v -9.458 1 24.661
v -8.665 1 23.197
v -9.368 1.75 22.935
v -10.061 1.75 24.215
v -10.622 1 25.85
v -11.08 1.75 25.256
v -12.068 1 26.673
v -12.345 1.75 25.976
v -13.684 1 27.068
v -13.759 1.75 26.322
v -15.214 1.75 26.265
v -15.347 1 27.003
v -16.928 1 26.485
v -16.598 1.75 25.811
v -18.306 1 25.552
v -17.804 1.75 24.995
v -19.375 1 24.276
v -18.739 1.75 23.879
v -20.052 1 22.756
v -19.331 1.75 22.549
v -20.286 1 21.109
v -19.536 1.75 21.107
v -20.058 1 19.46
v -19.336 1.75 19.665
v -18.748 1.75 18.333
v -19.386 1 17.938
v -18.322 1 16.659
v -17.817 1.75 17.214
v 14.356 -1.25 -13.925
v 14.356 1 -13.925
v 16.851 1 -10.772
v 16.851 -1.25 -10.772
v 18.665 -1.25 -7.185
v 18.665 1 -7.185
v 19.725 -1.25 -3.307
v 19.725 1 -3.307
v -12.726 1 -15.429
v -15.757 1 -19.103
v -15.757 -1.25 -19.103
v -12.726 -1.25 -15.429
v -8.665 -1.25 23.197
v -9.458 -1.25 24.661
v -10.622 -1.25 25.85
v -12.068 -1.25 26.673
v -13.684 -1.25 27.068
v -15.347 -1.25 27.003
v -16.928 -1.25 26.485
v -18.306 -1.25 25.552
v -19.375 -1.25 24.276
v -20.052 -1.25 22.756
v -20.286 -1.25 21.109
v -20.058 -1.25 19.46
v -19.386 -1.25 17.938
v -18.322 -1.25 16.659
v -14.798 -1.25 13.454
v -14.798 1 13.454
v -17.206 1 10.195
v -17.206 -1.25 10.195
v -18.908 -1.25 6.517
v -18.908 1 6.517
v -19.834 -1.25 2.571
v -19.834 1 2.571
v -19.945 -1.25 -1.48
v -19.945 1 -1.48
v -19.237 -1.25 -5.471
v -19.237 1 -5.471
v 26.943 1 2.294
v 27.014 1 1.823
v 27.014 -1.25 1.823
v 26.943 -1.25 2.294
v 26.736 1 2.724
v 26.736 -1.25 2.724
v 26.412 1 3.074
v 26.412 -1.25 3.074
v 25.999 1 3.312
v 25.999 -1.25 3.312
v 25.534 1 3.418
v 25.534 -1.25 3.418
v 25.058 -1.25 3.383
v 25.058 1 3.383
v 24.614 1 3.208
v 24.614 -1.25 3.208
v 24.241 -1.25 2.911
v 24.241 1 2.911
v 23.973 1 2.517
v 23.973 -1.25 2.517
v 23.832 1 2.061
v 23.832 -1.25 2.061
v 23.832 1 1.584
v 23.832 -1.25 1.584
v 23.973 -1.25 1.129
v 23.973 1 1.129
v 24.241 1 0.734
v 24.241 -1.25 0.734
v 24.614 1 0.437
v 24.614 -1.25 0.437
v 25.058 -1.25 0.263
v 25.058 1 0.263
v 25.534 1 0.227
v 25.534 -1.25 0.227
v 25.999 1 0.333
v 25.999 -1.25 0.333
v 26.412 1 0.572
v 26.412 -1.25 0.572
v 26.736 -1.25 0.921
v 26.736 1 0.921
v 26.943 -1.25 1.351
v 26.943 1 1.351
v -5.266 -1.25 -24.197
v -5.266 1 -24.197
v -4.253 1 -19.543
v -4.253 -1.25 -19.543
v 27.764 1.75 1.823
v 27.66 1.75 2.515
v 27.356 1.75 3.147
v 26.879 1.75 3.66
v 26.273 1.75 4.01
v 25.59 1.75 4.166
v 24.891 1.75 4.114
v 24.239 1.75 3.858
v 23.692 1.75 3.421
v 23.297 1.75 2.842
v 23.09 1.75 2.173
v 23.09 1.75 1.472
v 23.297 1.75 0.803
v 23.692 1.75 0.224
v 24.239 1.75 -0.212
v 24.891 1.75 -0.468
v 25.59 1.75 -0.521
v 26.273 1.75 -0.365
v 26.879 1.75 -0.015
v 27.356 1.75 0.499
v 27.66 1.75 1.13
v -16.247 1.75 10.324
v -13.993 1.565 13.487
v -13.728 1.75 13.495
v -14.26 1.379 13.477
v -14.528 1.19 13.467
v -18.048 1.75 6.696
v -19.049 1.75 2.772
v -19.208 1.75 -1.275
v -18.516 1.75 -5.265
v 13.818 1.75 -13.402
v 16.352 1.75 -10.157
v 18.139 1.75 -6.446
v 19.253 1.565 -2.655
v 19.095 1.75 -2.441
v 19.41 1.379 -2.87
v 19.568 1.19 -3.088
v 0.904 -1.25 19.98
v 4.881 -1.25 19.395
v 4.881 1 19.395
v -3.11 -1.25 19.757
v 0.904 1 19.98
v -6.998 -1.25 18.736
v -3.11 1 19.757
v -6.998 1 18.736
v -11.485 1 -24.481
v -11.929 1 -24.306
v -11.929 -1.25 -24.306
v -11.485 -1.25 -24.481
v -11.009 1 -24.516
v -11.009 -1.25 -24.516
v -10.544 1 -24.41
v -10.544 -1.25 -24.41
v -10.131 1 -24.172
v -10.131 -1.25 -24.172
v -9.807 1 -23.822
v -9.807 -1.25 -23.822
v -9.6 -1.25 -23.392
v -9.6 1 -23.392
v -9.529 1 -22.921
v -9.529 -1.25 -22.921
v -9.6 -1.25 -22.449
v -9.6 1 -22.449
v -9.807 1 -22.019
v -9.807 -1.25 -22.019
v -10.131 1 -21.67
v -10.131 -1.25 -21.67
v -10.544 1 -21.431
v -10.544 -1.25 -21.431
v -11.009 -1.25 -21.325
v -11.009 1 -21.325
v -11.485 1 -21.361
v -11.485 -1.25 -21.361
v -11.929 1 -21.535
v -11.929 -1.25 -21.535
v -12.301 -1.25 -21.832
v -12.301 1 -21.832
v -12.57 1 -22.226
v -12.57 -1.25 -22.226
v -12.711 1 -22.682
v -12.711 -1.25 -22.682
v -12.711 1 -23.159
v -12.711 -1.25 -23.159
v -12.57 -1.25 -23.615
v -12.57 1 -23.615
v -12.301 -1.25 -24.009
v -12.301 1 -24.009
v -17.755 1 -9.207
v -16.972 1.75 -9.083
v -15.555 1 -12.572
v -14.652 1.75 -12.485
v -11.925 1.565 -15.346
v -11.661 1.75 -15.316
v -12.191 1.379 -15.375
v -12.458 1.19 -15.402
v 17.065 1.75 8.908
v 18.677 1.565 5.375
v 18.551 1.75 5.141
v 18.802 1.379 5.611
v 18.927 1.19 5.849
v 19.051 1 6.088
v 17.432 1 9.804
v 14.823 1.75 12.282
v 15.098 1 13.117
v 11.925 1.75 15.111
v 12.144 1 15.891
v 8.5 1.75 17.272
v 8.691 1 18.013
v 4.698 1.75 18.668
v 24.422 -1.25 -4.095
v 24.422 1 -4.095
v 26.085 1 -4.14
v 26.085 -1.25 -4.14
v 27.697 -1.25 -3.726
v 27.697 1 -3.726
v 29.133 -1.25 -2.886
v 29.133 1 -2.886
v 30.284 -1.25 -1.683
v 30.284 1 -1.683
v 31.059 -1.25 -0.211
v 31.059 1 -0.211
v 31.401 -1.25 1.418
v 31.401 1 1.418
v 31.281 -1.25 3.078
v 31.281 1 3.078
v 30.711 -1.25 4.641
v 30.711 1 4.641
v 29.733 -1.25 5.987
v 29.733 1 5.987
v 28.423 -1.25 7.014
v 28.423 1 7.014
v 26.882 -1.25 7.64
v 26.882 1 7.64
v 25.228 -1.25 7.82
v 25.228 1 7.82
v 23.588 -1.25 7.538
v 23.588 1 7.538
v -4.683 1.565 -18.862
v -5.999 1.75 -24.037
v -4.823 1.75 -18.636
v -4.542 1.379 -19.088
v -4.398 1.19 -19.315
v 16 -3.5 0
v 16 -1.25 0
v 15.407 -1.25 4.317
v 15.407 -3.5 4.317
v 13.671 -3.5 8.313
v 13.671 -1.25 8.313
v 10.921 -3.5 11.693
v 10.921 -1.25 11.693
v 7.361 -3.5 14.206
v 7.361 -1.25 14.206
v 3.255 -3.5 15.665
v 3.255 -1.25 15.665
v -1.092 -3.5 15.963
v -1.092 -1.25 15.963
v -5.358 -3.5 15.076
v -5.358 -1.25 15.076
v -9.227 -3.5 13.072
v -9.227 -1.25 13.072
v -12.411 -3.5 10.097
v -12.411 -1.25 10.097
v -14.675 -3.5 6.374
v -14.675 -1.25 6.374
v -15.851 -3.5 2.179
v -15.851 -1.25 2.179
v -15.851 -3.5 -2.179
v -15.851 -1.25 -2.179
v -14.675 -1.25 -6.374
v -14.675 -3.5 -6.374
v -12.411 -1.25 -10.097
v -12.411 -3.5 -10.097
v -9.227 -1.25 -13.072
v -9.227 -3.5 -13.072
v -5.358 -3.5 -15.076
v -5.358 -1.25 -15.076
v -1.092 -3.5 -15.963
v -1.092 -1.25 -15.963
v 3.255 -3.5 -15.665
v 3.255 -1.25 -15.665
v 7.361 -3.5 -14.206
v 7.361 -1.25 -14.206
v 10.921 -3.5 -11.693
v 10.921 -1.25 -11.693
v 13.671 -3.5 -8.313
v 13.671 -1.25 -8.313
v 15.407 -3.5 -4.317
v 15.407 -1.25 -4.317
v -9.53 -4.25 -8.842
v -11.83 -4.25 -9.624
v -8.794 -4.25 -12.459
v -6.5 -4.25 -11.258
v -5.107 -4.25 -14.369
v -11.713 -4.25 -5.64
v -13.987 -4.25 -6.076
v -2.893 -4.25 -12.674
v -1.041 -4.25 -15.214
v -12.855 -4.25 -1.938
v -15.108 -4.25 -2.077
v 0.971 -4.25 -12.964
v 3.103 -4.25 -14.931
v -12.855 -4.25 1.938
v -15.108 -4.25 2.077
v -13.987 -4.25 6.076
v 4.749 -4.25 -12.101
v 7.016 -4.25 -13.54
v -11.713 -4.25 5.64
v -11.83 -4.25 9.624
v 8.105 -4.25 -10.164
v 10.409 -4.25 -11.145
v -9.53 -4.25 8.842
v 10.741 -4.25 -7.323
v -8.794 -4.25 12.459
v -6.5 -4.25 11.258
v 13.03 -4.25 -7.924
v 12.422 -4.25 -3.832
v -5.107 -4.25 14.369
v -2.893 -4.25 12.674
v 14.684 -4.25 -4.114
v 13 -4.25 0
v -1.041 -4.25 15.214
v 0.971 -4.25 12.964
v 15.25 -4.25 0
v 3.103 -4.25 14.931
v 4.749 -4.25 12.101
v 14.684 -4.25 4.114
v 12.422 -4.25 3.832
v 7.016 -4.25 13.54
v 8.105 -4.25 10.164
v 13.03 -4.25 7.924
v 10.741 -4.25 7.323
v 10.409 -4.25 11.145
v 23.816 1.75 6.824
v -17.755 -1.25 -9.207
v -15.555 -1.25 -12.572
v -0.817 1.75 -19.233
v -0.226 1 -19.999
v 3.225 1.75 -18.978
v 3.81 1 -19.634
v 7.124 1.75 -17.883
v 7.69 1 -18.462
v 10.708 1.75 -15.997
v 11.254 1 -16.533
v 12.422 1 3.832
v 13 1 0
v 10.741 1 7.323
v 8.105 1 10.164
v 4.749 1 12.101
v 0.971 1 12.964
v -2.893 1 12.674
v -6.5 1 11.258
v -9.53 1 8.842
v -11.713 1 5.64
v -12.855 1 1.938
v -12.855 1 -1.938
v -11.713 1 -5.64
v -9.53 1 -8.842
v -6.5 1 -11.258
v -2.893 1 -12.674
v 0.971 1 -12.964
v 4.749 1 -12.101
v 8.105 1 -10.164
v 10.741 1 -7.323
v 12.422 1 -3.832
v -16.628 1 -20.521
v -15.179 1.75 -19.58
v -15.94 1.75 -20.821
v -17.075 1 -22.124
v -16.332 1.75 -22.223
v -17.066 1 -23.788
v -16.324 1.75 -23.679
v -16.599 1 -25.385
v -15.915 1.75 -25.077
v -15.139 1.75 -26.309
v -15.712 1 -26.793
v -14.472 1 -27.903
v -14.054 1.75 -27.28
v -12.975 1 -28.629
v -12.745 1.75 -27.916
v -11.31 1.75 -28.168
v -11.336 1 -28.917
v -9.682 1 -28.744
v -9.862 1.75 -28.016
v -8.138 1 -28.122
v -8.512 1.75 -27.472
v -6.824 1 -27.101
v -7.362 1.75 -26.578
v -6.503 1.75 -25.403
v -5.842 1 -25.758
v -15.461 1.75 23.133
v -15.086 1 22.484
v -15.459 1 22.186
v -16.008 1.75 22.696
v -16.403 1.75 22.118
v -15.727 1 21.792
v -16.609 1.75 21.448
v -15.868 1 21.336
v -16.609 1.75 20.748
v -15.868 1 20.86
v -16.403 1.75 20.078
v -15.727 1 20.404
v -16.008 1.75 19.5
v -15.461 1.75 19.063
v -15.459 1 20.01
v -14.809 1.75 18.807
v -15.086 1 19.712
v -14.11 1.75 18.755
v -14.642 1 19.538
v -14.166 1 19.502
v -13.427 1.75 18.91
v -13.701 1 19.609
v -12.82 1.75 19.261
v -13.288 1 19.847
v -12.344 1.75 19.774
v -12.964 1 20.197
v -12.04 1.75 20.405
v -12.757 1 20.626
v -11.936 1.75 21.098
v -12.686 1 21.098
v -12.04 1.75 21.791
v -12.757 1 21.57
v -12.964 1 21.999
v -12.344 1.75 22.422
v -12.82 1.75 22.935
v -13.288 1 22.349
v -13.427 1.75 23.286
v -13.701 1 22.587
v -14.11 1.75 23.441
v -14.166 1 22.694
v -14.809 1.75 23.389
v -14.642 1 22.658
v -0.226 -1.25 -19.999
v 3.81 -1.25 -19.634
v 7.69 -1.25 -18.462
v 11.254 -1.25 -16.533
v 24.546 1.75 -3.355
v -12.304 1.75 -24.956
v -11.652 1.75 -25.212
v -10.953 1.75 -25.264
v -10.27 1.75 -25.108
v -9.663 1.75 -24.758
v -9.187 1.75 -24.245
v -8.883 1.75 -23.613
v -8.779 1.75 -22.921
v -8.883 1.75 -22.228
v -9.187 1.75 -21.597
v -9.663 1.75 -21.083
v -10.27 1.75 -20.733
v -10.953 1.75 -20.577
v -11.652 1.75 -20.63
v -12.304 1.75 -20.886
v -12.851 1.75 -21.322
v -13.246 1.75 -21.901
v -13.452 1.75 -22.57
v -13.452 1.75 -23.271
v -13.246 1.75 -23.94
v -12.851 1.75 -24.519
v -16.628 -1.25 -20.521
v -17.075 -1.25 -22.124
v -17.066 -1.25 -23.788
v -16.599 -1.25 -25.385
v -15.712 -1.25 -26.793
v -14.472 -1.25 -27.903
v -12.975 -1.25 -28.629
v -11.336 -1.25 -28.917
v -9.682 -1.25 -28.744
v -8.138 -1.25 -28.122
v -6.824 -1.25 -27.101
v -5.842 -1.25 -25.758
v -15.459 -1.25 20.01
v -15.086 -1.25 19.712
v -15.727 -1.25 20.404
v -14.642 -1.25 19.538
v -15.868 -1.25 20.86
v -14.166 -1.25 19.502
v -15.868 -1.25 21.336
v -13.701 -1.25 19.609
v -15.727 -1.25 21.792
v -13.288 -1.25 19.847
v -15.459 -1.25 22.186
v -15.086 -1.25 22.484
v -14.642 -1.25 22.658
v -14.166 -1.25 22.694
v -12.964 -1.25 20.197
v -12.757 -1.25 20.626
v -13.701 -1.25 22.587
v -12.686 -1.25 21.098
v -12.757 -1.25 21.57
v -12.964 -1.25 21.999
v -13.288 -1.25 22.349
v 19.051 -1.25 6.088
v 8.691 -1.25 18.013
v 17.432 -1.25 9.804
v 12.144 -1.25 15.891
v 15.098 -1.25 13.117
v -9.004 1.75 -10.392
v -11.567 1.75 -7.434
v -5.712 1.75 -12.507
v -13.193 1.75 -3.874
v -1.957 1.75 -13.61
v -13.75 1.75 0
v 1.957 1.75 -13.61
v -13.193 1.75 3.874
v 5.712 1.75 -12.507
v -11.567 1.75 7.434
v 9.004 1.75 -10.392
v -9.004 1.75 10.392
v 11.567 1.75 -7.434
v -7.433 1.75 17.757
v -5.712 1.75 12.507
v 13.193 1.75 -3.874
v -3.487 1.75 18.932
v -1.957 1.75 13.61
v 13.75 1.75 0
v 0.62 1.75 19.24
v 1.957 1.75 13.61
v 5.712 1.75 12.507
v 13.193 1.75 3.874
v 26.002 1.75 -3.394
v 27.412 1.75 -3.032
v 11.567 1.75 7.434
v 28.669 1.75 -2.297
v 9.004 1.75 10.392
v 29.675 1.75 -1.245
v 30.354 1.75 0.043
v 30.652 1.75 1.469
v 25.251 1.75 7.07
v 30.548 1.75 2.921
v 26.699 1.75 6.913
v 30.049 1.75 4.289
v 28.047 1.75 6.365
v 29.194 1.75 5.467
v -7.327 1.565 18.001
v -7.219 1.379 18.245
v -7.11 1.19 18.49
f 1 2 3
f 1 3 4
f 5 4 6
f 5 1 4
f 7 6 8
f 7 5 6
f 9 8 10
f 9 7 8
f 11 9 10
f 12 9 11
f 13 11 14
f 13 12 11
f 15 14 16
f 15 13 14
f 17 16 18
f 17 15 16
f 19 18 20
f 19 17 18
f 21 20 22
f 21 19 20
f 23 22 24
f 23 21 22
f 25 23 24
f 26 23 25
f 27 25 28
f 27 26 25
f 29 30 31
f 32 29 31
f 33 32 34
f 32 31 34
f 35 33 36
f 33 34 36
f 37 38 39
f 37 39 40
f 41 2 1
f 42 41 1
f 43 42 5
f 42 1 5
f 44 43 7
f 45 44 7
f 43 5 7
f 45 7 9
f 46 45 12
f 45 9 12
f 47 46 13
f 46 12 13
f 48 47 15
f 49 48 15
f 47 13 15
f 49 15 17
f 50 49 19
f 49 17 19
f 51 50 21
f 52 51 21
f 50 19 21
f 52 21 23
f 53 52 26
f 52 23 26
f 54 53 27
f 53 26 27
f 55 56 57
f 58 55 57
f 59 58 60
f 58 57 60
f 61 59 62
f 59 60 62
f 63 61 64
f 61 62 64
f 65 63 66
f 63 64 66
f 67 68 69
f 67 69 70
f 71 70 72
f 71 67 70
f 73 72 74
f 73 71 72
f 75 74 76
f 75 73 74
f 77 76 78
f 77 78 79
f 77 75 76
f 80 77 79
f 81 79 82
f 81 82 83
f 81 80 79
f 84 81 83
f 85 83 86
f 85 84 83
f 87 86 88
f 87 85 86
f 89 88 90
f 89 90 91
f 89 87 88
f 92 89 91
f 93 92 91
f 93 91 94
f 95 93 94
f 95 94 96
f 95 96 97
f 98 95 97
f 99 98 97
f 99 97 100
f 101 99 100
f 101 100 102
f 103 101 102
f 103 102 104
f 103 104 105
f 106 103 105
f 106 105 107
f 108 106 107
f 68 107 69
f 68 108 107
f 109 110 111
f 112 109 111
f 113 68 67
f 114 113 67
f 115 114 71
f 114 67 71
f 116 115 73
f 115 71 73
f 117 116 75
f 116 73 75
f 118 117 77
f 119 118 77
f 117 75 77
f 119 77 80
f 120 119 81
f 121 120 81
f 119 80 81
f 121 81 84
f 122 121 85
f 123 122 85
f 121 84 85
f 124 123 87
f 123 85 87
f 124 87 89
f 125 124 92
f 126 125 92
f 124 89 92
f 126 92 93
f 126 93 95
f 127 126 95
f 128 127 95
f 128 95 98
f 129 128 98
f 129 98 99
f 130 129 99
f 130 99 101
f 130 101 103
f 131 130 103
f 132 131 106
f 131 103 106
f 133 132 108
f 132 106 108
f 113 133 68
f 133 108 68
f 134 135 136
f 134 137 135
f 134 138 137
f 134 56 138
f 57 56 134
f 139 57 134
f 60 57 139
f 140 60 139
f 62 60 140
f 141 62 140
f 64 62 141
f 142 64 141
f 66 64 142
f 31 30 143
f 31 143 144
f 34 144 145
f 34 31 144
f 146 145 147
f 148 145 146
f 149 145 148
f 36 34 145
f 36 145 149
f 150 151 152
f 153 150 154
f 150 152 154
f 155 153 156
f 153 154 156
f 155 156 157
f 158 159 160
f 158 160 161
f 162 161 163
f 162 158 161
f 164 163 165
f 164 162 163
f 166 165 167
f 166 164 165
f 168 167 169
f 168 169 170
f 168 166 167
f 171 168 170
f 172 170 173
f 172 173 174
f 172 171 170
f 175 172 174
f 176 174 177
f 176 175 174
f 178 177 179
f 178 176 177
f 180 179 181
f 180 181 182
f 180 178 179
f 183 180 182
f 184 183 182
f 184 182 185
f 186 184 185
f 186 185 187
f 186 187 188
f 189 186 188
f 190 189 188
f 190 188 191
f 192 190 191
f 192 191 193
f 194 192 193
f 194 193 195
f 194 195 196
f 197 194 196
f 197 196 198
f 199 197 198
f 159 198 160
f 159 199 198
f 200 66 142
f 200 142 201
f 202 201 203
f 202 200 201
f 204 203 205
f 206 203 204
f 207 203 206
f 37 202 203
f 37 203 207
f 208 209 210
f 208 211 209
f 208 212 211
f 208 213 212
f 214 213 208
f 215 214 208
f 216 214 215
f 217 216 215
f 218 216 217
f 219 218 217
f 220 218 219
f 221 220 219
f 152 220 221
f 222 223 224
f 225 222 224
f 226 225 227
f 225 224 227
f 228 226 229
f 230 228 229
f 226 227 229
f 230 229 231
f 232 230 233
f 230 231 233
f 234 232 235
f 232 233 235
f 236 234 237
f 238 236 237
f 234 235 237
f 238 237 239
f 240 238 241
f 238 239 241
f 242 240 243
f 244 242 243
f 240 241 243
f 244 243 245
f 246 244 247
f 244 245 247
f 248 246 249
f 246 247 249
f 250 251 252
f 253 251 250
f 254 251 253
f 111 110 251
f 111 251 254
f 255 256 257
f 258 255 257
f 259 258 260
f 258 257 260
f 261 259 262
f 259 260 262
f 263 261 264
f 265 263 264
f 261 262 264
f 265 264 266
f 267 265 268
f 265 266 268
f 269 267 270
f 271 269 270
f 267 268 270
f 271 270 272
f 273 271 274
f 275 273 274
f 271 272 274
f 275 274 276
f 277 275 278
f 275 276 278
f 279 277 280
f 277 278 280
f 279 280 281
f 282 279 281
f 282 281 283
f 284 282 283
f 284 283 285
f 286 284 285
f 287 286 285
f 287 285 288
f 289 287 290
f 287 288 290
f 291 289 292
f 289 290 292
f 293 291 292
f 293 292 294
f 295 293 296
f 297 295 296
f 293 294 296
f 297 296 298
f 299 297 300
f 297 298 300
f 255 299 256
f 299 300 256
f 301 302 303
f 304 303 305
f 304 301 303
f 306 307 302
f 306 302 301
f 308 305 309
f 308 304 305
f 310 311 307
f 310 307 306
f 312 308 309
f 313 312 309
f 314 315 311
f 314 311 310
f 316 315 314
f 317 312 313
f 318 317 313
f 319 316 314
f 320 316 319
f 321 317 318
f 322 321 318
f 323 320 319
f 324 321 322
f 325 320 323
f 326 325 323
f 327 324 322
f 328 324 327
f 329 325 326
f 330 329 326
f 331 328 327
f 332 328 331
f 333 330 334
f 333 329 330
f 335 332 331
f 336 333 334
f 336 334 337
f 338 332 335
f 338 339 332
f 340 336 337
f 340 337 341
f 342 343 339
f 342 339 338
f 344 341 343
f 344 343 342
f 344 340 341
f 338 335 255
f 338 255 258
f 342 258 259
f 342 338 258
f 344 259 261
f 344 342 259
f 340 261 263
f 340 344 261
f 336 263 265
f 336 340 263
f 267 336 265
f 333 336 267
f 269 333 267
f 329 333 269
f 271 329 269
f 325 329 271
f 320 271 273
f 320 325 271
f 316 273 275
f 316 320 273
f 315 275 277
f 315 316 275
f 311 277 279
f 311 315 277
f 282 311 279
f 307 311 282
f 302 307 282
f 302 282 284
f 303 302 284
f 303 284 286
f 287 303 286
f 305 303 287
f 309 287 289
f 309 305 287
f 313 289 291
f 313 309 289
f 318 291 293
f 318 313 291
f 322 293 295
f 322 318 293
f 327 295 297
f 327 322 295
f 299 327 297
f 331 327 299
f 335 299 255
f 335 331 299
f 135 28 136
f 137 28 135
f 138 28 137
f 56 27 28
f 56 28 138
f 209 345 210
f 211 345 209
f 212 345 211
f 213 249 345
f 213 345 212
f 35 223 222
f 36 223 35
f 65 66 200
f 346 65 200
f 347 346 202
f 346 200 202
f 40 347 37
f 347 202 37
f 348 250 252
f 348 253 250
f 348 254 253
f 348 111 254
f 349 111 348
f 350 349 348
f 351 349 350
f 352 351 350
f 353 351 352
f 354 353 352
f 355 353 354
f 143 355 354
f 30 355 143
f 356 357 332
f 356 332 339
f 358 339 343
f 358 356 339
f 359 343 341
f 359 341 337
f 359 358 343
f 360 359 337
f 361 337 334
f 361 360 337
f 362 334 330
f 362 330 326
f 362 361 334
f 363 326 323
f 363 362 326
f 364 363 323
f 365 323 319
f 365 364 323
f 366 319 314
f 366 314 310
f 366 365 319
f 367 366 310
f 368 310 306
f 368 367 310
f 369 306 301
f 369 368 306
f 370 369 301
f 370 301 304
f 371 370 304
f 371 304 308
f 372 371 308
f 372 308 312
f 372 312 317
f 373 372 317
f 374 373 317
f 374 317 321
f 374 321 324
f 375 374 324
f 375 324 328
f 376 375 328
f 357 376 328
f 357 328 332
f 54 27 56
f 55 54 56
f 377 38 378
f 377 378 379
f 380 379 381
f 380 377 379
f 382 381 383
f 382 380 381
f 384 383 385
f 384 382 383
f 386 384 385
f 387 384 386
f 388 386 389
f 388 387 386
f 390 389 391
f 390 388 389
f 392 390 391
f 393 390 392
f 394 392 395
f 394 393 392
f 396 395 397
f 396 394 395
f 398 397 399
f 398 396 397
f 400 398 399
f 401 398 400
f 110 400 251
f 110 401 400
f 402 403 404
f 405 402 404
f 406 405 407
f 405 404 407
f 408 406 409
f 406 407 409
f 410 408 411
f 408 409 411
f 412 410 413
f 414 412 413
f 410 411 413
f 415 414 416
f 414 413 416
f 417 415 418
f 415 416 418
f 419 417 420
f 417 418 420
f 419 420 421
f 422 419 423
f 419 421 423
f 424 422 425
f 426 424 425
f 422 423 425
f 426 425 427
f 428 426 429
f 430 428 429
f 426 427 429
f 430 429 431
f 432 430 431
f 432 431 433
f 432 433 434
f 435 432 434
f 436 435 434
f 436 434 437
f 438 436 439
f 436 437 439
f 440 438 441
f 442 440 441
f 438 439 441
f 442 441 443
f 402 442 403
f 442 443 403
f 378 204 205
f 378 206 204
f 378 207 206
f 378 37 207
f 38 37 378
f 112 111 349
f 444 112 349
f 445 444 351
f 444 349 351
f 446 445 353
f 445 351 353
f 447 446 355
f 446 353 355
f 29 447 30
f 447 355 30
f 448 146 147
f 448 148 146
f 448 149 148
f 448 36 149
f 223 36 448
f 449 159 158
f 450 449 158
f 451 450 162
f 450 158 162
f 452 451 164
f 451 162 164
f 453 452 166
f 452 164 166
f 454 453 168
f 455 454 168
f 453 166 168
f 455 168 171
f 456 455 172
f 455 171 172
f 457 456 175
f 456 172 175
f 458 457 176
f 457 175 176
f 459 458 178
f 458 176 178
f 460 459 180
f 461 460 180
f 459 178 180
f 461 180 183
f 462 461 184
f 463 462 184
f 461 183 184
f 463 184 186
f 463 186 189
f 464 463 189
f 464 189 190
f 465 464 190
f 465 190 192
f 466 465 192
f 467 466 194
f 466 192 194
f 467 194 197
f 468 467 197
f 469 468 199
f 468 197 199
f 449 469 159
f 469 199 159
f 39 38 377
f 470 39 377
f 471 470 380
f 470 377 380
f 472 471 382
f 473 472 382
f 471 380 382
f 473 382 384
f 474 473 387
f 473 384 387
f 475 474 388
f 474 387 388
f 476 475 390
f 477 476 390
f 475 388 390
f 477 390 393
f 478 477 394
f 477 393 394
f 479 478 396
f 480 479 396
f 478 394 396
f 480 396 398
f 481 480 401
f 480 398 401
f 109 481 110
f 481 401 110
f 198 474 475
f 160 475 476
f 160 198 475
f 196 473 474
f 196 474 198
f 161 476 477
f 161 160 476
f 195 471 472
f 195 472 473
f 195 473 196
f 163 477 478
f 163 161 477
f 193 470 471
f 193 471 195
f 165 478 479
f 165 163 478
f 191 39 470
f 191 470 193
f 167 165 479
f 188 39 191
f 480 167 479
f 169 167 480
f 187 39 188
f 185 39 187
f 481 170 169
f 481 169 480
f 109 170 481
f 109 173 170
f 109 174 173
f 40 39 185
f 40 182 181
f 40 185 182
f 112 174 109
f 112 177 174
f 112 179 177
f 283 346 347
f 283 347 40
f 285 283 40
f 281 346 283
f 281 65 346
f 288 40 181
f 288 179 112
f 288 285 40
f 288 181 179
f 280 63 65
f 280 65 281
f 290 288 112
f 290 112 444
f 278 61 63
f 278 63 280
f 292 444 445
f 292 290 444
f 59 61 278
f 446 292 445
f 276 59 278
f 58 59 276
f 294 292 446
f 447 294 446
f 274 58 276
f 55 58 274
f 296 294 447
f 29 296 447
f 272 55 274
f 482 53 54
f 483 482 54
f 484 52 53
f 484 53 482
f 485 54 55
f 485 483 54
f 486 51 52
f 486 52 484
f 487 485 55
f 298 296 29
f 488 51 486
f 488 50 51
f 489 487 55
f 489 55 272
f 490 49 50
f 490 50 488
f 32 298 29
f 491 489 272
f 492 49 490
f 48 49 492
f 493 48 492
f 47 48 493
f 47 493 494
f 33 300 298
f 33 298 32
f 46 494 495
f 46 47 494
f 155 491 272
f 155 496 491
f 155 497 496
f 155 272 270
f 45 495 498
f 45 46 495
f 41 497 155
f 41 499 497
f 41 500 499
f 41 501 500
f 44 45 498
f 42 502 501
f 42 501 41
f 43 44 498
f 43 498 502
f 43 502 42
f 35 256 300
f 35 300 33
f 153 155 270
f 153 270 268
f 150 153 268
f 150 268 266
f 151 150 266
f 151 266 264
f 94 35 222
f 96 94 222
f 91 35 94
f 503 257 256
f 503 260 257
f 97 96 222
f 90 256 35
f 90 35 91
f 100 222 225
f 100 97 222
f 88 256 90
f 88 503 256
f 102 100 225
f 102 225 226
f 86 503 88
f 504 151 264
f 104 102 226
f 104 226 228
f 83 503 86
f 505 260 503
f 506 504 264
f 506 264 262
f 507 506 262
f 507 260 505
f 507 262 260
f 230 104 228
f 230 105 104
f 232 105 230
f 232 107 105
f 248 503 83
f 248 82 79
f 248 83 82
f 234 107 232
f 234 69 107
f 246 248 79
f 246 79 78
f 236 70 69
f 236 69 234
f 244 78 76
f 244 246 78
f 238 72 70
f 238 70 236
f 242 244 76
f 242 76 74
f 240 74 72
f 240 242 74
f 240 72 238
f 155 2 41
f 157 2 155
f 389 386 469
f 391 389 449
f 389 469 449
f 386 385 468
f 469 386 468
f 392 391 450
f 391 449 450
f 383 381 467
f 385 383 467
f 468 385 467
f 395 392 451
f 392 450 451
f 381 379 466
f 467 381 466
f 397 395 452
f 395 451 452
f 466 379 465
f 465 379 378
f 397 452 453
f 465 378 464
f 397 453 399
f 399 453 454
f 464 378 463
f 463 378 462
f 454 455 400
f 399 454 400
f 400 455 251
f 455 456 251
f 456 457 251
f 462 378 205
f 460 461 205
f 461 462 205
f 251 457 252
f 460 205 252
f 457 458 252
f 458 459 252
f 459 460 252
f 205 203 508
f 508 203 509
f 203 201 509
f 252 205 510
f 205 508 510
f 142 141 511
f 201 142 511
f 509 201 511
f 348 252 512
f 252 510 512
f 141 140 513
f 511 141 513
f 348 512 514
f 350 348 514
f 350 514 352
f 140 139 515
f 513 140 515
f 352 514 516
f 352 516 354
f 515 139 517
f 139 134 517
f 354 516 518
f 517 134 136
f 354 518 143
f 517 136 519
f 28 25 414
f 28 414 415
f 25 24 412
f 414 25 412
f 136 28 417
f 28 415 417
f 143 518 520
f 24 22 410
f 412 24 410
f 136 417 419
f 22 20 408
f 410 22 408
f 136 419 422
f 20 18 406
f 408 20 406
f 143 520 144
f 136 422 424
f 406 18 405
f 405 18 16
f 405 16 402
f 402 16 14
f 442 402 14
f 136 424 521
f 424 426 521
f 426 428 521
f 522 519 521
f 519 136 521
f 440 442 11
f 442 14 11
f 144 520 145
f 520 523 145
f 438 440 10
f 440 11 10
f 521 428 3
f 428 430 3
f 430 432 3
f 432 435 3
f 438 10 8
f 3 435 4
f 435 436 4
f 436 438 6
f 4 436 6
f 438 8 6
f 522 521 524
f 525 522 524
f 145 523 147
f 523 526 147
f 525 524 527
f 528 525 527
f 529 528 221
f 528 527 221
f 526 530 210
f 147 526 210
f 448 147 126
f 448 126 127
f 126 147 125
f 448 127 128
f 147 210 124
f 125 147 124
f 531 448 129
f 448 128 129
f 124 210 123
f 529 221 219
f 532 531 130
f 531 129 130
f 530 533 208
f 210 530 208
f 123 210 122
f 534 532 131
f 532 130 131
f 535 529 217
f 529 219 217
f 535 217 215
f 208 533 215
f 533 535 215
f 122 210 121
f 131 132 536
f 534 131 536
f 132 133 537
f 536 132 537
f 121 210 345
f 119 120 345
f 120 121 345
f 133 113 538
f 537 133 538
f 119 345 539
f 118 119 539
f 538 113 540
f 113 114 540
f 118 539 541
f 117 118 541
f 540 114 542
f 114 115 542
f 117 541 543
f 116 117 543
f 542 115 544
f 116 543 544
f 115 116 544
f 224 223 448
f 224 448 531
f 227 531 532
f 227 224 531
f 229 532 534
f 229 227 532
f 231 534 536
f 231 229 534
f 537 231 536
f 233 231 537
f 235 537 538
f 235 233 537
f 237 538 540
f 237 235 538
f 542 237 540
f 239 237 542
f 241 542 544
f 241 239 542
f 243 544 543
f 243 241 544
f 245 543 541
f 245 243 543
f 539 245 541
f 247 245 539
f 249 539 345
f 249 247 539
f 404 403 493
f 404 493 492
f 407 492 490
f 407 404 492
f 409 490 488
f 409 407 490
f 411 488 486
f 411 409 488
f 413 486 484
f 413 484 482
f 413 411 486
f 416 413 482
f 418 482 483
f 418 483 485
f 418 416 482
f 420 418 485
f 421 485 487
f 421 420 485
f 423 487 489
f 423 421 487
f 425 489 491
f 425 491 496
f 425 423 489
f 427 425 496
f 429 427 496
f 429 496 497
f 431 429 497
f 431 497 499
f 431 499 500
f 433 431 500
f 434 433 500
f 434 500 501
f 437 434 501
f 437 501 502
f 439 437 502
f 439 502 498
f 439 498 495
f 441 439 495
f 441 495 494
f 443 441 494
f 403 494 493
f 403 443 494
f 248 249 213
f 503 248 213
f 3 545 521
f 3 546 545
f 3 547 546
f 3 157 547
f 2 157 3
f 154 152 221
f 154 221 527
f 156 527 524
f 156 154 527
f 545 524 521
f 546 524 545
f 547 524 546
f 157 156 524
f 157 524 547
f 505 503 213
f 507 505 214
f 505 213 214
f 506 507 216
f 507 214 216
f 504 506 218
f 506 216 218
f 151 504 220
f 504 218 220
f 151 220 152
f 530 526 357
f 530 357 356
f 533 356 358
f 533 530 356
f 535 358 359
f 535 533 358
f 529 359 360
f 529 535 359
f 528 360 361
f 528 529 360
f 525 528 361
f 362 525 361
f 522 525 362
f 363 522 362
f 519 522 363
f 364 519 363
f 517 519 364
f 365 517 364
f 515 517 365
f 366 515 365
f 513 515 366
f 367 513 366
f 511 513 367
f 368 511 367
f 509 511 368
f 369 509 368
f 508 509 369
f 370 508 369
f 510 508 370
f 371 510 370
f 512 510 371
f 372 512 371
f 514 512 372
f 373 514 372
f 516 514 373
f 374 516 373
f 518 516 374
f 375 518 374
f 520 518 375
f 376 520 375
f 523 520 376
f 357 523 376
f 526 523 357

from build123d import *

# Parameters (mm, degrees)
SKETCH004_R           = 13
SKETCH004_R_2         = 1.6
PAD001_DEPTH          = 3
POLARPATTERN001_COUNT = 3
SKETCH005_R           = 16
SKETCH005_R_2         = 13
PAD002_DEPTH          = 3
CHAMFER003_SIZE       = 0.75


with BuildPart() as part:
    # Sketch004 (on Face1 of Binder001) → Pad001 (new body)
    with BuildSketch(Plane.XZ.offset(-1.75)):
        with BuildLine():
            ThreePointArc((19.050853, 6.088102), (-19.94876, -1.430732), (19.724681, -3.307108))
            Line((24.422075, -4.094689), (19.724681, -3.307108))
            ThreePointArc((24.422075, -4.094689), (31.398835, 2.251935), (23.587776, 7.537972))
            Line((23.587776, 7.537972), (19.050853, 6.088102))
        make_face()
        Circle(SKETCH004_R, mode=Mode.SUBTRACT)
        with Locations((25.414207, 1.822716)):
            Circle(SKETCH004_R_2, mode=Mode.SUBTRACT)
    pad001 = extrude(amount=PAD001_DEPTH)

    # PolarPattern001: Pad001 ×3 about axis
    polarpattern001_axis = Axis((0, 1.75, 0), (0, -1, 0))
    for i in range(1, POLARPATTERN001_COUNT):
        add(pad001.rotate(polarpattern001_axis, i * 360 / POLARPATTERN001_COUNT))

    # Sketch005 (on Face17 of PolarPattern001) → Pad002 (join)
    with BuildSketch(Plane.XZ.offset(1.25)):
        Circle(SKETCH005_R)
        Circle(SKETCH005_R_2, mode=Mode.SUBTRACT)
    extrude(amount=PAD002_DEPTH)

    # Chamfer003
    chamfer003_edges = [part.edges().sort_by_distance(p)[0] for p in [
        (-16, -4.25, 0),
        (31.398835, 1.75, 2.251935),
        (22.073378, 1.75, -3.700898),
        (11.21343, 1.75, -16.560767),
        (-4.759394, 1.75, -21.869587),
        (-13.749184, 1.75, -28.318156),
        (-14.241761, 1.75, -17.265657),
        (-19.94876, 1.75, -1.430732),
        (-16.55992, 1.75, 15.05655),
        (-17.64965, 1.75, 26.066221),
        (-7.831617, 1.75, 20.966555),
        (8.73533, 1.75, 17.991498),
        (21.319315, 1.75, 6.813037),
        (6.5, 1.75, 11.25833),
        (-13, 1.75, 0),
        (6.5, 1.75, -11.25833),
        (23.814207, 1.75, 1.822716),
        (-13.485622, 1.75, 19.71235),
        (-10.328585, 1.75, -21.535066),
    ]]
    chamfer(chamfer003_edges, length=CHAMFER003_SIZE)


solid = part.part
